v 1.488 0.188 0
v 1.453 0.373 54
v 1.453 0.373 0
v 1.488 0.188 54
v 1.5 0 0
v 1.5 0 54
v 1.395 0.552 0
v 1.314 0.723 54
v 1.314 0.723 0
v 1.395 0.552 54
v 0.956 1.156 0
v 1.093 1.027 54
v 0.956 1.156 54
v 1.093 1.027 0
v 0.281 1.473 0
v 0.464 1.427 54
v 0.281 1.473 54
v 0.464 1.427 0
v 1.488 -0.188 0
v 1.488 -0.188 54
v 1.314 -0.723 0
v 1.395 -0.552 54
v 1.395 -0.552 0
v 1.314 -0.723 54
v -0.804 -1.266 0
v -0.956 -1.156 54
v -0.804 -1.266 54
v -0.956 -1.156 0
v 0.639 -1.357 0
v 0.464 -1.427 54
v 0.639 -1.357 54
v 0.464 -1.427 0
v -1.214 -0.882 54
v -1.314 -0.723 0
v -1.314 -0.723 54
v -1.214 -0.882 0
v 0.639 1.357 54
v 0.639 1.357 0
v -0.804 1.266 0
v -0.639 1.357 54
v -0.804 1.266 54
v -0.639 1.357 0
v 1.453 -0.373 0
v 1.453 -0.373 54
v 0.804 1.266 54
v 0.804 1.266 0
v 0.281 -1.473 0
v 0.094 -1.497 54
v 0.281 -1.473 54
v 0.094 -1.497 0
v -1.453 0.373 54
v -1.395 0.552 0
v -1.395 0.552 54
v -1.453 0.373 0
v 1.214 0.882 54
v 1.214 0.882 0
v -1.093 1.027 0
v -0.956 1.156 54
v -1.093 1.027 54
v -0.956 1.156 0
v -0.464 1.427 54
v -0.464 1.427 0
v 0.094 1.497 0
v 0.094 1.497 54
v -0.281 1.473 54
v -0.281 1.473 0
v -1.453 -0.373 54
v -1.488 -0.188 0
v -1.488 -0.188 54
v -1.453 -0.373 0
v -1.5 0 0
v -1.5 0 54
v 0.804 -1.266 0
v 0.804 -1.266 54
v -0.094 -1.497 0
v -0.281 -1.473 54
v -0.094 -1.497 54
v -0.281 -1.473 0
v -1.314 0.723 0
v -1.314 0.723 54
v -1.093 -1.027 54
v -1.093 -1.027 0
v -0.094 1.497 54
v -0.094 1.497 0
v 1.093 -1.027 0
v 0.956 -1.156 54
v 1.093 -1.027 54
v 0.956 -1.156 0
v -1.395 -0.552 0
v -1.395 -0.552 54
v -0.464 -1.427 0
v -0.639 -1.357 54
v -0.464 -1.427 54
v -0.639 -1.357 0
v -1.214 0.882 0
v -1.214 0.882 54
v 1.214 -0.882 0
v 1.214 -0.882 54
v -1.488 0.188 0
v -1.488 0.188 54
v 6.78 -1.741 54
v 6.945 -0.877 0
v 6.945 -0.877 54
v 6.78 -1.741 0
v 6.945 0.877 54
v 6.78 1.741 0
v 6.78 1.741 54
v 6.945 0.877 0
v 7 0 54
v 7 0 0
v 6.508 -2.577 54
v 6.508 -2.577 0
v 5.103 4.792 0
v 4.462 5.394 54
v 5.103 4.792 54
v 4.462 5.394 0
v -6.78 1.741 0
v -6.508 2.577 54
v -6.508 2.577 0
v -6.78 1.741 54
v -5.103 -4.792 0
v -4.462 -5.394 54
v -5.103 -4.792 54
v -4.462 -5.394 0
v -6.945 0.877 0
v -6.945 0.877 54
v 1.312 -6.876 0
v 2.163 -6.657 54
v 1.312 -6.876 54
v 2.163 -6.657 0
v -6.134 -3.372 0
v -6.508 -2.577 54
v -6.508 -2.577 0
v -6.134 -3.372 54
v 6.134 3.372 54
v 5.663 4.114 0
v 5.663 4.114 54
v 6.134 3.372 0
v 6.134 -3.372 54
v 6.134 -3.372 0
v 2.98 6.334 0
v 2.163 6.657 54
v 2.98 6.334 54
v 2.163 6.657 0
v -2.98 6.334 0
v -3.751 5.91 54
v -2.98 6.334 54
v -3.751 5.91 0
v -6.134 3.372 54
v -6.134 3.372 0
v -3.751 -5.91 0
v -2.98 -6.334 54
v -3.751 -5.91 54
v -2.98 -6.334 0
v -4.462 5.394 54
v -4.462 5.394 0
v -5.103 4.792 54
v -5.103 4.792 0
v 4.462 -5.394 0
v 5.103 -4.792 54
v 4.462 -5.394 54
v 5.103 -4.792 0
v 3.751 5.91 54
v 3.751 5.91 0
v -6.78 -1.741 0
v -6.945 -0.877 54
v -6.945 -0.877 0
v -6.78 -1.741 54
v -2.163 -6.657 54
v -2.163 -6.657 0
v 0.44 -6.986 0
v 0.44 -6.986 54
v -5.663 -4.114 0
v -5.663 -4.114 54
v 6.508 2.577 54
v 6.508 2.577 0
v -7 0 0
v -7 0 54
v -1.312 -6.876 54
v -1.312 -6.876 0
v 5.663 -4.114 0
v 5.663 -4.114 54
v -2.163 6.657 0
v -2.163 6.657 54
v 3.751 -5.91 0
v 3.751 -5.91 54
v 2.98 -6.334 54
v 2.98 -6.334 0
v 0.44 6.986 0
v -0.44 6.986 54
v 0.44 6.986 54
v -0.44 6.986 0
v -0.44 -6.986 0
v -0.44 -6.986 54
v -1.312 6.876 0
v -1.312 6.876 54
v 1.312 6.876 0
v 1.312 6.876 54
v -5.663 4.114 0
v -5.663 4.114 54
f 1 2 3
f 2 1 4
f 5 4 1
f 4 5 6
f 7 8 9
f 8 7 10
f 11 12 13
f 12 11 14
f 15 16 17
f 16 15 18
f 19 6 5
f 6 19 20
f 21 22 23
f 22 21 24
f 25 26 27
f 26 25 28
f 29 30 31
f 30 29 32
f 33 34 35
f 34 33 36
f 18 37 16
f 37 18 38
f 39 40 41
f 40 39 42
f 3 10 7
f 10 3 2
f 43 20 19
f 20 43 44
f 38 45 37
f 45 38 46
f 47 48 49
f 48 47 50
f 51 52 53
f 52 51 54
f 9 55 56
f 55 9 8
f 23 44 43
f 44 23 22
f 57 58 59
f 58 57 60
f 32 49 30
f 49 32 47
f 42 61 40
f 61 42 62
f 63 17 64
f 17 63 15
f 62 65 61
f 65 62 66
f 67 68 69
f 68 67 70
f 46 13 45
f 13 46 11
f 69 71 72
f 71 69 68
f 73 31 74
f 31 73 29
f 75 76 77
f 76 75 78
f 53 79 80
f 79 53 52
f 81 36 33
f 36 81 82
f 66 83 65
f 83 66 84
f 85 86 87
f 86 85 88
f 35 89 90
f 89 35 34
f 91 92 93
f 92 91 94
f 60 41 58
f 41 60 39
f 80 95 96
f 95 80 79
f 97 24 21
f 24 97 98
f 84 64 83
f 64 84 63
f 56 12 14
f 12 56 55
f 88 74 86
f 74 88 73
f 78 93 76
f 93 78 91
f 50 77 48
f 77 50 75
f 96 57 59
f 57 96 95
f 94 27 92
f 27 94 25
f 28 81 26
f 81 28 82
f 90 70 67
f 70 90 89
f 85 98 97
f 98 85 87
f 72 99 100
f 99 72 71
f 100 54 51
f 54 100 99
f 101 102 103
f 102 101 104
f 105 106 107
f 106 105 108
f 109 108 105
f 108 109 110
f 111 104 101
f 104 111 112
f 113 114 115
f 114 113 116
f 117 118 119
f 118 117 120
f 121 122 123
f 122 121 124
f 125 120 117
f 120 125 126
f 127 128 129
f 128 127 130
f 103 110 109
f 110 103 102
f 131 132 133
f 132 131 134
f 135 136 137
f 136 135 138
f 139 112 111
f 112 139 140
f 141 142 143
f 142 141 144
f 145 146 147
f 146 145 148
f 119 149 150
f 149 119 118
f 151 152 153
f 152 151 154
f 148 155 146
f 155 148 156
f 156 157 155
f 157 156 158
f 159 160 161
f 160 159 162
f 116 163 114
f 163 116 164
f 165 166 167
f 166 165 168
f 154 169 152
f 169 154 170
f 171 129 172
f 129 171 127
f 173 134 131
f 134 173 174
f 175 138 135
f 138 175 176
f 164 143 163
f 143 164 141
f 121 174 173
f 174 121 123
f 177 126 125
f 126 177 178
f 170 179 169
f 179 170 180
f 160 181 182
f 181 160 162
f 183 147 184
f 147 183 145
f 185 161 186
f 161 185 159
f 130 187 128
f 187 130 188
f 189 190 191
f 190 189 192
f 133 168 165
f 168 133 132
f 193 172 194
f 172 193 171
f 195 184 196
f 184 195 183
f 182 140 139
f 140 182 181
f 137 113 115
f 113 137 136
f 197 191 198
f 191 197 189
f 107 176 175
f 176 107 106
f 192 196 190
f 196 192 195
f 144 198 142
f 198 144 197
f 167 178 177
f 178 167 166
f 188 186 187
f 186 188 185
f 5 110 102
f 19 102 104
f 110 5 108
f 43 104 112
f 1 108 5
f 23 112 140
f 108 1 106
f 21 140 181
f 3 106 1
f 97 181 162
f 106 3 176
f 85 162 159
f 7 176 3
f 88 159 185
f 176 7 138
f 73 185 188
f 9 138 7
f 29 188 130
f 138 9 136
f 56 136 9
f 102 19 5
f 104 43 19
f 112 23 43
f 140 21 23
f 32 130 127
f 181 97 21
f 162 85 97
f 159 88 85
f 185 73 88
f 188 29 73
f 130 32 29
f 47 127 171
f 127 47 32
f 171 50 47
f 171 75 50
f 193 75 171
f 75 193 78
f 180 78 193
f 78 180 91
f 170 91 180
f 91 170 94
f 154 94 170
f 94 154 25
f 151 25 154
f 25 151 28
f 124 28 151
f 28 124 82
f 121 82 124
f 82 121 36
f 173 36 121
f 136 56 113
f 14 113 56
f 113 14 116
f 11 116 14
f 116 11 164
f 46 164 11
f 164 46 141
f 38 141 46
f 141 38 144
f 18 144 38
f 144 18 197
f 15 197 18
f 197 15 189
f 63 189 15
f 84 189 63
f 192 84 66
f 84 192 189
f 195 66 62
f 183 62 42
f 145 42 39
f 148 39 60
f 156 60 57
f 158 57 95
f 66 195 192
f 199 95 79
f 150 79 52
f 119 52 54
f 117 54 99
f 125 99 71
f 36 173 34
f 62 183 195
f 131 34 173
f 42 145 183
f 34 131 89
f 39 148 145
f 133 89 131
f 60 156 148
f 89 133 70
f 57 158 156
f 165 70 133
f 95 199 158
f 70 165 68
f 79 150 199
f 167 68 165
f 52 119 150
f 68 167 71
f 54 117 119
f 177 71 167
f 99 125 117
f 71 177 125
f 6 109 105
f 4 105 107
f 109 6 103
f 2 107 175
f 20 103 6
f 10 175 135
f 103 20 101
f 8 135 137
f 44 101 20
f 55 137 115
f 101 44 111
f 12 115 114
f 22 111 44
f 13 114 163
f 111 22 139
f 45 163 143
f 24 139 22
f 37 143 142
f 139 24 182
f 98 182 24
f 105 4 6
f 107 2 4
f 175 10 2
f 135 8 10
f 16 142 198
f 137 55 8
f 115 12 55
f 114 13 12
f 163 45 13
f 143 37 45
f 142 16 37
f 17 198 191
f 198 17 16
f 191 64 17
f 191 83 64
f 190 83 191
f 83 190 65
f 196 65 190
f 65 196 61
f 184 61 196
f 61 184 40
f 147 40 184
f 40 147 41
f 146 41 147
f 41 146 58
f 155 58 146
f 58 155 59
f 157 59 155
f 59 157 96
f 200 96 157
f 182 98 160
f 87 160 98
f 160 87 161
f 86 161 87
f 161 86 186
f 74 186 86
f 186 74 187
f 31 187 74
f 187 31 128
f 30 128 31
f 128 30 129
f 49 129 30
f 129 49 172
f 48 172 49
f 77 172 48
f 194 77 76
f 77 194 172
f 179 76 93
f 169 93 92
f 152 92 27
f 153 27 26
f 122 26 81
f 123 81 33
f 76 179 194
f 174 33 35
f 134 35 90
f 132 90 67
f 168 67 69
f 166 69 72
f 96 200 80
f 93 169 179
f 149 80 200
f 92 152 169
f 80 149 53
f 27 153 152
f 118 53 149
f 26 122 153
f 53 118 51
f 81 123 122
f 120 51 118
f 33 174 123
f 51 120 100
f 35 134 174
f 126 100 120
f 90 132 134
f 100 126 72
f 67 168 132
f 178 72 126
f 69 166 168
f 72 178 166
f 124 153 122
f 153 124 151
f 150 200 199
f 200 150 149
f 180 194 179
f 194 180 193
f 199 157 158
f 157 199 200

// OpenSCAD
$fn = 50;


difference() {
	union() {
		cylinder(h = 54, r = 7.0000000000);
	}
	union() {
		translate(v = [0, 0, -100]) {
			cylinder(h = 200, r = 1.5000000000);
		}
		translate(v = [0, 0, -100]) {
			cylinder(h = 200, r = 1.5000000000);
		}
	}
}
